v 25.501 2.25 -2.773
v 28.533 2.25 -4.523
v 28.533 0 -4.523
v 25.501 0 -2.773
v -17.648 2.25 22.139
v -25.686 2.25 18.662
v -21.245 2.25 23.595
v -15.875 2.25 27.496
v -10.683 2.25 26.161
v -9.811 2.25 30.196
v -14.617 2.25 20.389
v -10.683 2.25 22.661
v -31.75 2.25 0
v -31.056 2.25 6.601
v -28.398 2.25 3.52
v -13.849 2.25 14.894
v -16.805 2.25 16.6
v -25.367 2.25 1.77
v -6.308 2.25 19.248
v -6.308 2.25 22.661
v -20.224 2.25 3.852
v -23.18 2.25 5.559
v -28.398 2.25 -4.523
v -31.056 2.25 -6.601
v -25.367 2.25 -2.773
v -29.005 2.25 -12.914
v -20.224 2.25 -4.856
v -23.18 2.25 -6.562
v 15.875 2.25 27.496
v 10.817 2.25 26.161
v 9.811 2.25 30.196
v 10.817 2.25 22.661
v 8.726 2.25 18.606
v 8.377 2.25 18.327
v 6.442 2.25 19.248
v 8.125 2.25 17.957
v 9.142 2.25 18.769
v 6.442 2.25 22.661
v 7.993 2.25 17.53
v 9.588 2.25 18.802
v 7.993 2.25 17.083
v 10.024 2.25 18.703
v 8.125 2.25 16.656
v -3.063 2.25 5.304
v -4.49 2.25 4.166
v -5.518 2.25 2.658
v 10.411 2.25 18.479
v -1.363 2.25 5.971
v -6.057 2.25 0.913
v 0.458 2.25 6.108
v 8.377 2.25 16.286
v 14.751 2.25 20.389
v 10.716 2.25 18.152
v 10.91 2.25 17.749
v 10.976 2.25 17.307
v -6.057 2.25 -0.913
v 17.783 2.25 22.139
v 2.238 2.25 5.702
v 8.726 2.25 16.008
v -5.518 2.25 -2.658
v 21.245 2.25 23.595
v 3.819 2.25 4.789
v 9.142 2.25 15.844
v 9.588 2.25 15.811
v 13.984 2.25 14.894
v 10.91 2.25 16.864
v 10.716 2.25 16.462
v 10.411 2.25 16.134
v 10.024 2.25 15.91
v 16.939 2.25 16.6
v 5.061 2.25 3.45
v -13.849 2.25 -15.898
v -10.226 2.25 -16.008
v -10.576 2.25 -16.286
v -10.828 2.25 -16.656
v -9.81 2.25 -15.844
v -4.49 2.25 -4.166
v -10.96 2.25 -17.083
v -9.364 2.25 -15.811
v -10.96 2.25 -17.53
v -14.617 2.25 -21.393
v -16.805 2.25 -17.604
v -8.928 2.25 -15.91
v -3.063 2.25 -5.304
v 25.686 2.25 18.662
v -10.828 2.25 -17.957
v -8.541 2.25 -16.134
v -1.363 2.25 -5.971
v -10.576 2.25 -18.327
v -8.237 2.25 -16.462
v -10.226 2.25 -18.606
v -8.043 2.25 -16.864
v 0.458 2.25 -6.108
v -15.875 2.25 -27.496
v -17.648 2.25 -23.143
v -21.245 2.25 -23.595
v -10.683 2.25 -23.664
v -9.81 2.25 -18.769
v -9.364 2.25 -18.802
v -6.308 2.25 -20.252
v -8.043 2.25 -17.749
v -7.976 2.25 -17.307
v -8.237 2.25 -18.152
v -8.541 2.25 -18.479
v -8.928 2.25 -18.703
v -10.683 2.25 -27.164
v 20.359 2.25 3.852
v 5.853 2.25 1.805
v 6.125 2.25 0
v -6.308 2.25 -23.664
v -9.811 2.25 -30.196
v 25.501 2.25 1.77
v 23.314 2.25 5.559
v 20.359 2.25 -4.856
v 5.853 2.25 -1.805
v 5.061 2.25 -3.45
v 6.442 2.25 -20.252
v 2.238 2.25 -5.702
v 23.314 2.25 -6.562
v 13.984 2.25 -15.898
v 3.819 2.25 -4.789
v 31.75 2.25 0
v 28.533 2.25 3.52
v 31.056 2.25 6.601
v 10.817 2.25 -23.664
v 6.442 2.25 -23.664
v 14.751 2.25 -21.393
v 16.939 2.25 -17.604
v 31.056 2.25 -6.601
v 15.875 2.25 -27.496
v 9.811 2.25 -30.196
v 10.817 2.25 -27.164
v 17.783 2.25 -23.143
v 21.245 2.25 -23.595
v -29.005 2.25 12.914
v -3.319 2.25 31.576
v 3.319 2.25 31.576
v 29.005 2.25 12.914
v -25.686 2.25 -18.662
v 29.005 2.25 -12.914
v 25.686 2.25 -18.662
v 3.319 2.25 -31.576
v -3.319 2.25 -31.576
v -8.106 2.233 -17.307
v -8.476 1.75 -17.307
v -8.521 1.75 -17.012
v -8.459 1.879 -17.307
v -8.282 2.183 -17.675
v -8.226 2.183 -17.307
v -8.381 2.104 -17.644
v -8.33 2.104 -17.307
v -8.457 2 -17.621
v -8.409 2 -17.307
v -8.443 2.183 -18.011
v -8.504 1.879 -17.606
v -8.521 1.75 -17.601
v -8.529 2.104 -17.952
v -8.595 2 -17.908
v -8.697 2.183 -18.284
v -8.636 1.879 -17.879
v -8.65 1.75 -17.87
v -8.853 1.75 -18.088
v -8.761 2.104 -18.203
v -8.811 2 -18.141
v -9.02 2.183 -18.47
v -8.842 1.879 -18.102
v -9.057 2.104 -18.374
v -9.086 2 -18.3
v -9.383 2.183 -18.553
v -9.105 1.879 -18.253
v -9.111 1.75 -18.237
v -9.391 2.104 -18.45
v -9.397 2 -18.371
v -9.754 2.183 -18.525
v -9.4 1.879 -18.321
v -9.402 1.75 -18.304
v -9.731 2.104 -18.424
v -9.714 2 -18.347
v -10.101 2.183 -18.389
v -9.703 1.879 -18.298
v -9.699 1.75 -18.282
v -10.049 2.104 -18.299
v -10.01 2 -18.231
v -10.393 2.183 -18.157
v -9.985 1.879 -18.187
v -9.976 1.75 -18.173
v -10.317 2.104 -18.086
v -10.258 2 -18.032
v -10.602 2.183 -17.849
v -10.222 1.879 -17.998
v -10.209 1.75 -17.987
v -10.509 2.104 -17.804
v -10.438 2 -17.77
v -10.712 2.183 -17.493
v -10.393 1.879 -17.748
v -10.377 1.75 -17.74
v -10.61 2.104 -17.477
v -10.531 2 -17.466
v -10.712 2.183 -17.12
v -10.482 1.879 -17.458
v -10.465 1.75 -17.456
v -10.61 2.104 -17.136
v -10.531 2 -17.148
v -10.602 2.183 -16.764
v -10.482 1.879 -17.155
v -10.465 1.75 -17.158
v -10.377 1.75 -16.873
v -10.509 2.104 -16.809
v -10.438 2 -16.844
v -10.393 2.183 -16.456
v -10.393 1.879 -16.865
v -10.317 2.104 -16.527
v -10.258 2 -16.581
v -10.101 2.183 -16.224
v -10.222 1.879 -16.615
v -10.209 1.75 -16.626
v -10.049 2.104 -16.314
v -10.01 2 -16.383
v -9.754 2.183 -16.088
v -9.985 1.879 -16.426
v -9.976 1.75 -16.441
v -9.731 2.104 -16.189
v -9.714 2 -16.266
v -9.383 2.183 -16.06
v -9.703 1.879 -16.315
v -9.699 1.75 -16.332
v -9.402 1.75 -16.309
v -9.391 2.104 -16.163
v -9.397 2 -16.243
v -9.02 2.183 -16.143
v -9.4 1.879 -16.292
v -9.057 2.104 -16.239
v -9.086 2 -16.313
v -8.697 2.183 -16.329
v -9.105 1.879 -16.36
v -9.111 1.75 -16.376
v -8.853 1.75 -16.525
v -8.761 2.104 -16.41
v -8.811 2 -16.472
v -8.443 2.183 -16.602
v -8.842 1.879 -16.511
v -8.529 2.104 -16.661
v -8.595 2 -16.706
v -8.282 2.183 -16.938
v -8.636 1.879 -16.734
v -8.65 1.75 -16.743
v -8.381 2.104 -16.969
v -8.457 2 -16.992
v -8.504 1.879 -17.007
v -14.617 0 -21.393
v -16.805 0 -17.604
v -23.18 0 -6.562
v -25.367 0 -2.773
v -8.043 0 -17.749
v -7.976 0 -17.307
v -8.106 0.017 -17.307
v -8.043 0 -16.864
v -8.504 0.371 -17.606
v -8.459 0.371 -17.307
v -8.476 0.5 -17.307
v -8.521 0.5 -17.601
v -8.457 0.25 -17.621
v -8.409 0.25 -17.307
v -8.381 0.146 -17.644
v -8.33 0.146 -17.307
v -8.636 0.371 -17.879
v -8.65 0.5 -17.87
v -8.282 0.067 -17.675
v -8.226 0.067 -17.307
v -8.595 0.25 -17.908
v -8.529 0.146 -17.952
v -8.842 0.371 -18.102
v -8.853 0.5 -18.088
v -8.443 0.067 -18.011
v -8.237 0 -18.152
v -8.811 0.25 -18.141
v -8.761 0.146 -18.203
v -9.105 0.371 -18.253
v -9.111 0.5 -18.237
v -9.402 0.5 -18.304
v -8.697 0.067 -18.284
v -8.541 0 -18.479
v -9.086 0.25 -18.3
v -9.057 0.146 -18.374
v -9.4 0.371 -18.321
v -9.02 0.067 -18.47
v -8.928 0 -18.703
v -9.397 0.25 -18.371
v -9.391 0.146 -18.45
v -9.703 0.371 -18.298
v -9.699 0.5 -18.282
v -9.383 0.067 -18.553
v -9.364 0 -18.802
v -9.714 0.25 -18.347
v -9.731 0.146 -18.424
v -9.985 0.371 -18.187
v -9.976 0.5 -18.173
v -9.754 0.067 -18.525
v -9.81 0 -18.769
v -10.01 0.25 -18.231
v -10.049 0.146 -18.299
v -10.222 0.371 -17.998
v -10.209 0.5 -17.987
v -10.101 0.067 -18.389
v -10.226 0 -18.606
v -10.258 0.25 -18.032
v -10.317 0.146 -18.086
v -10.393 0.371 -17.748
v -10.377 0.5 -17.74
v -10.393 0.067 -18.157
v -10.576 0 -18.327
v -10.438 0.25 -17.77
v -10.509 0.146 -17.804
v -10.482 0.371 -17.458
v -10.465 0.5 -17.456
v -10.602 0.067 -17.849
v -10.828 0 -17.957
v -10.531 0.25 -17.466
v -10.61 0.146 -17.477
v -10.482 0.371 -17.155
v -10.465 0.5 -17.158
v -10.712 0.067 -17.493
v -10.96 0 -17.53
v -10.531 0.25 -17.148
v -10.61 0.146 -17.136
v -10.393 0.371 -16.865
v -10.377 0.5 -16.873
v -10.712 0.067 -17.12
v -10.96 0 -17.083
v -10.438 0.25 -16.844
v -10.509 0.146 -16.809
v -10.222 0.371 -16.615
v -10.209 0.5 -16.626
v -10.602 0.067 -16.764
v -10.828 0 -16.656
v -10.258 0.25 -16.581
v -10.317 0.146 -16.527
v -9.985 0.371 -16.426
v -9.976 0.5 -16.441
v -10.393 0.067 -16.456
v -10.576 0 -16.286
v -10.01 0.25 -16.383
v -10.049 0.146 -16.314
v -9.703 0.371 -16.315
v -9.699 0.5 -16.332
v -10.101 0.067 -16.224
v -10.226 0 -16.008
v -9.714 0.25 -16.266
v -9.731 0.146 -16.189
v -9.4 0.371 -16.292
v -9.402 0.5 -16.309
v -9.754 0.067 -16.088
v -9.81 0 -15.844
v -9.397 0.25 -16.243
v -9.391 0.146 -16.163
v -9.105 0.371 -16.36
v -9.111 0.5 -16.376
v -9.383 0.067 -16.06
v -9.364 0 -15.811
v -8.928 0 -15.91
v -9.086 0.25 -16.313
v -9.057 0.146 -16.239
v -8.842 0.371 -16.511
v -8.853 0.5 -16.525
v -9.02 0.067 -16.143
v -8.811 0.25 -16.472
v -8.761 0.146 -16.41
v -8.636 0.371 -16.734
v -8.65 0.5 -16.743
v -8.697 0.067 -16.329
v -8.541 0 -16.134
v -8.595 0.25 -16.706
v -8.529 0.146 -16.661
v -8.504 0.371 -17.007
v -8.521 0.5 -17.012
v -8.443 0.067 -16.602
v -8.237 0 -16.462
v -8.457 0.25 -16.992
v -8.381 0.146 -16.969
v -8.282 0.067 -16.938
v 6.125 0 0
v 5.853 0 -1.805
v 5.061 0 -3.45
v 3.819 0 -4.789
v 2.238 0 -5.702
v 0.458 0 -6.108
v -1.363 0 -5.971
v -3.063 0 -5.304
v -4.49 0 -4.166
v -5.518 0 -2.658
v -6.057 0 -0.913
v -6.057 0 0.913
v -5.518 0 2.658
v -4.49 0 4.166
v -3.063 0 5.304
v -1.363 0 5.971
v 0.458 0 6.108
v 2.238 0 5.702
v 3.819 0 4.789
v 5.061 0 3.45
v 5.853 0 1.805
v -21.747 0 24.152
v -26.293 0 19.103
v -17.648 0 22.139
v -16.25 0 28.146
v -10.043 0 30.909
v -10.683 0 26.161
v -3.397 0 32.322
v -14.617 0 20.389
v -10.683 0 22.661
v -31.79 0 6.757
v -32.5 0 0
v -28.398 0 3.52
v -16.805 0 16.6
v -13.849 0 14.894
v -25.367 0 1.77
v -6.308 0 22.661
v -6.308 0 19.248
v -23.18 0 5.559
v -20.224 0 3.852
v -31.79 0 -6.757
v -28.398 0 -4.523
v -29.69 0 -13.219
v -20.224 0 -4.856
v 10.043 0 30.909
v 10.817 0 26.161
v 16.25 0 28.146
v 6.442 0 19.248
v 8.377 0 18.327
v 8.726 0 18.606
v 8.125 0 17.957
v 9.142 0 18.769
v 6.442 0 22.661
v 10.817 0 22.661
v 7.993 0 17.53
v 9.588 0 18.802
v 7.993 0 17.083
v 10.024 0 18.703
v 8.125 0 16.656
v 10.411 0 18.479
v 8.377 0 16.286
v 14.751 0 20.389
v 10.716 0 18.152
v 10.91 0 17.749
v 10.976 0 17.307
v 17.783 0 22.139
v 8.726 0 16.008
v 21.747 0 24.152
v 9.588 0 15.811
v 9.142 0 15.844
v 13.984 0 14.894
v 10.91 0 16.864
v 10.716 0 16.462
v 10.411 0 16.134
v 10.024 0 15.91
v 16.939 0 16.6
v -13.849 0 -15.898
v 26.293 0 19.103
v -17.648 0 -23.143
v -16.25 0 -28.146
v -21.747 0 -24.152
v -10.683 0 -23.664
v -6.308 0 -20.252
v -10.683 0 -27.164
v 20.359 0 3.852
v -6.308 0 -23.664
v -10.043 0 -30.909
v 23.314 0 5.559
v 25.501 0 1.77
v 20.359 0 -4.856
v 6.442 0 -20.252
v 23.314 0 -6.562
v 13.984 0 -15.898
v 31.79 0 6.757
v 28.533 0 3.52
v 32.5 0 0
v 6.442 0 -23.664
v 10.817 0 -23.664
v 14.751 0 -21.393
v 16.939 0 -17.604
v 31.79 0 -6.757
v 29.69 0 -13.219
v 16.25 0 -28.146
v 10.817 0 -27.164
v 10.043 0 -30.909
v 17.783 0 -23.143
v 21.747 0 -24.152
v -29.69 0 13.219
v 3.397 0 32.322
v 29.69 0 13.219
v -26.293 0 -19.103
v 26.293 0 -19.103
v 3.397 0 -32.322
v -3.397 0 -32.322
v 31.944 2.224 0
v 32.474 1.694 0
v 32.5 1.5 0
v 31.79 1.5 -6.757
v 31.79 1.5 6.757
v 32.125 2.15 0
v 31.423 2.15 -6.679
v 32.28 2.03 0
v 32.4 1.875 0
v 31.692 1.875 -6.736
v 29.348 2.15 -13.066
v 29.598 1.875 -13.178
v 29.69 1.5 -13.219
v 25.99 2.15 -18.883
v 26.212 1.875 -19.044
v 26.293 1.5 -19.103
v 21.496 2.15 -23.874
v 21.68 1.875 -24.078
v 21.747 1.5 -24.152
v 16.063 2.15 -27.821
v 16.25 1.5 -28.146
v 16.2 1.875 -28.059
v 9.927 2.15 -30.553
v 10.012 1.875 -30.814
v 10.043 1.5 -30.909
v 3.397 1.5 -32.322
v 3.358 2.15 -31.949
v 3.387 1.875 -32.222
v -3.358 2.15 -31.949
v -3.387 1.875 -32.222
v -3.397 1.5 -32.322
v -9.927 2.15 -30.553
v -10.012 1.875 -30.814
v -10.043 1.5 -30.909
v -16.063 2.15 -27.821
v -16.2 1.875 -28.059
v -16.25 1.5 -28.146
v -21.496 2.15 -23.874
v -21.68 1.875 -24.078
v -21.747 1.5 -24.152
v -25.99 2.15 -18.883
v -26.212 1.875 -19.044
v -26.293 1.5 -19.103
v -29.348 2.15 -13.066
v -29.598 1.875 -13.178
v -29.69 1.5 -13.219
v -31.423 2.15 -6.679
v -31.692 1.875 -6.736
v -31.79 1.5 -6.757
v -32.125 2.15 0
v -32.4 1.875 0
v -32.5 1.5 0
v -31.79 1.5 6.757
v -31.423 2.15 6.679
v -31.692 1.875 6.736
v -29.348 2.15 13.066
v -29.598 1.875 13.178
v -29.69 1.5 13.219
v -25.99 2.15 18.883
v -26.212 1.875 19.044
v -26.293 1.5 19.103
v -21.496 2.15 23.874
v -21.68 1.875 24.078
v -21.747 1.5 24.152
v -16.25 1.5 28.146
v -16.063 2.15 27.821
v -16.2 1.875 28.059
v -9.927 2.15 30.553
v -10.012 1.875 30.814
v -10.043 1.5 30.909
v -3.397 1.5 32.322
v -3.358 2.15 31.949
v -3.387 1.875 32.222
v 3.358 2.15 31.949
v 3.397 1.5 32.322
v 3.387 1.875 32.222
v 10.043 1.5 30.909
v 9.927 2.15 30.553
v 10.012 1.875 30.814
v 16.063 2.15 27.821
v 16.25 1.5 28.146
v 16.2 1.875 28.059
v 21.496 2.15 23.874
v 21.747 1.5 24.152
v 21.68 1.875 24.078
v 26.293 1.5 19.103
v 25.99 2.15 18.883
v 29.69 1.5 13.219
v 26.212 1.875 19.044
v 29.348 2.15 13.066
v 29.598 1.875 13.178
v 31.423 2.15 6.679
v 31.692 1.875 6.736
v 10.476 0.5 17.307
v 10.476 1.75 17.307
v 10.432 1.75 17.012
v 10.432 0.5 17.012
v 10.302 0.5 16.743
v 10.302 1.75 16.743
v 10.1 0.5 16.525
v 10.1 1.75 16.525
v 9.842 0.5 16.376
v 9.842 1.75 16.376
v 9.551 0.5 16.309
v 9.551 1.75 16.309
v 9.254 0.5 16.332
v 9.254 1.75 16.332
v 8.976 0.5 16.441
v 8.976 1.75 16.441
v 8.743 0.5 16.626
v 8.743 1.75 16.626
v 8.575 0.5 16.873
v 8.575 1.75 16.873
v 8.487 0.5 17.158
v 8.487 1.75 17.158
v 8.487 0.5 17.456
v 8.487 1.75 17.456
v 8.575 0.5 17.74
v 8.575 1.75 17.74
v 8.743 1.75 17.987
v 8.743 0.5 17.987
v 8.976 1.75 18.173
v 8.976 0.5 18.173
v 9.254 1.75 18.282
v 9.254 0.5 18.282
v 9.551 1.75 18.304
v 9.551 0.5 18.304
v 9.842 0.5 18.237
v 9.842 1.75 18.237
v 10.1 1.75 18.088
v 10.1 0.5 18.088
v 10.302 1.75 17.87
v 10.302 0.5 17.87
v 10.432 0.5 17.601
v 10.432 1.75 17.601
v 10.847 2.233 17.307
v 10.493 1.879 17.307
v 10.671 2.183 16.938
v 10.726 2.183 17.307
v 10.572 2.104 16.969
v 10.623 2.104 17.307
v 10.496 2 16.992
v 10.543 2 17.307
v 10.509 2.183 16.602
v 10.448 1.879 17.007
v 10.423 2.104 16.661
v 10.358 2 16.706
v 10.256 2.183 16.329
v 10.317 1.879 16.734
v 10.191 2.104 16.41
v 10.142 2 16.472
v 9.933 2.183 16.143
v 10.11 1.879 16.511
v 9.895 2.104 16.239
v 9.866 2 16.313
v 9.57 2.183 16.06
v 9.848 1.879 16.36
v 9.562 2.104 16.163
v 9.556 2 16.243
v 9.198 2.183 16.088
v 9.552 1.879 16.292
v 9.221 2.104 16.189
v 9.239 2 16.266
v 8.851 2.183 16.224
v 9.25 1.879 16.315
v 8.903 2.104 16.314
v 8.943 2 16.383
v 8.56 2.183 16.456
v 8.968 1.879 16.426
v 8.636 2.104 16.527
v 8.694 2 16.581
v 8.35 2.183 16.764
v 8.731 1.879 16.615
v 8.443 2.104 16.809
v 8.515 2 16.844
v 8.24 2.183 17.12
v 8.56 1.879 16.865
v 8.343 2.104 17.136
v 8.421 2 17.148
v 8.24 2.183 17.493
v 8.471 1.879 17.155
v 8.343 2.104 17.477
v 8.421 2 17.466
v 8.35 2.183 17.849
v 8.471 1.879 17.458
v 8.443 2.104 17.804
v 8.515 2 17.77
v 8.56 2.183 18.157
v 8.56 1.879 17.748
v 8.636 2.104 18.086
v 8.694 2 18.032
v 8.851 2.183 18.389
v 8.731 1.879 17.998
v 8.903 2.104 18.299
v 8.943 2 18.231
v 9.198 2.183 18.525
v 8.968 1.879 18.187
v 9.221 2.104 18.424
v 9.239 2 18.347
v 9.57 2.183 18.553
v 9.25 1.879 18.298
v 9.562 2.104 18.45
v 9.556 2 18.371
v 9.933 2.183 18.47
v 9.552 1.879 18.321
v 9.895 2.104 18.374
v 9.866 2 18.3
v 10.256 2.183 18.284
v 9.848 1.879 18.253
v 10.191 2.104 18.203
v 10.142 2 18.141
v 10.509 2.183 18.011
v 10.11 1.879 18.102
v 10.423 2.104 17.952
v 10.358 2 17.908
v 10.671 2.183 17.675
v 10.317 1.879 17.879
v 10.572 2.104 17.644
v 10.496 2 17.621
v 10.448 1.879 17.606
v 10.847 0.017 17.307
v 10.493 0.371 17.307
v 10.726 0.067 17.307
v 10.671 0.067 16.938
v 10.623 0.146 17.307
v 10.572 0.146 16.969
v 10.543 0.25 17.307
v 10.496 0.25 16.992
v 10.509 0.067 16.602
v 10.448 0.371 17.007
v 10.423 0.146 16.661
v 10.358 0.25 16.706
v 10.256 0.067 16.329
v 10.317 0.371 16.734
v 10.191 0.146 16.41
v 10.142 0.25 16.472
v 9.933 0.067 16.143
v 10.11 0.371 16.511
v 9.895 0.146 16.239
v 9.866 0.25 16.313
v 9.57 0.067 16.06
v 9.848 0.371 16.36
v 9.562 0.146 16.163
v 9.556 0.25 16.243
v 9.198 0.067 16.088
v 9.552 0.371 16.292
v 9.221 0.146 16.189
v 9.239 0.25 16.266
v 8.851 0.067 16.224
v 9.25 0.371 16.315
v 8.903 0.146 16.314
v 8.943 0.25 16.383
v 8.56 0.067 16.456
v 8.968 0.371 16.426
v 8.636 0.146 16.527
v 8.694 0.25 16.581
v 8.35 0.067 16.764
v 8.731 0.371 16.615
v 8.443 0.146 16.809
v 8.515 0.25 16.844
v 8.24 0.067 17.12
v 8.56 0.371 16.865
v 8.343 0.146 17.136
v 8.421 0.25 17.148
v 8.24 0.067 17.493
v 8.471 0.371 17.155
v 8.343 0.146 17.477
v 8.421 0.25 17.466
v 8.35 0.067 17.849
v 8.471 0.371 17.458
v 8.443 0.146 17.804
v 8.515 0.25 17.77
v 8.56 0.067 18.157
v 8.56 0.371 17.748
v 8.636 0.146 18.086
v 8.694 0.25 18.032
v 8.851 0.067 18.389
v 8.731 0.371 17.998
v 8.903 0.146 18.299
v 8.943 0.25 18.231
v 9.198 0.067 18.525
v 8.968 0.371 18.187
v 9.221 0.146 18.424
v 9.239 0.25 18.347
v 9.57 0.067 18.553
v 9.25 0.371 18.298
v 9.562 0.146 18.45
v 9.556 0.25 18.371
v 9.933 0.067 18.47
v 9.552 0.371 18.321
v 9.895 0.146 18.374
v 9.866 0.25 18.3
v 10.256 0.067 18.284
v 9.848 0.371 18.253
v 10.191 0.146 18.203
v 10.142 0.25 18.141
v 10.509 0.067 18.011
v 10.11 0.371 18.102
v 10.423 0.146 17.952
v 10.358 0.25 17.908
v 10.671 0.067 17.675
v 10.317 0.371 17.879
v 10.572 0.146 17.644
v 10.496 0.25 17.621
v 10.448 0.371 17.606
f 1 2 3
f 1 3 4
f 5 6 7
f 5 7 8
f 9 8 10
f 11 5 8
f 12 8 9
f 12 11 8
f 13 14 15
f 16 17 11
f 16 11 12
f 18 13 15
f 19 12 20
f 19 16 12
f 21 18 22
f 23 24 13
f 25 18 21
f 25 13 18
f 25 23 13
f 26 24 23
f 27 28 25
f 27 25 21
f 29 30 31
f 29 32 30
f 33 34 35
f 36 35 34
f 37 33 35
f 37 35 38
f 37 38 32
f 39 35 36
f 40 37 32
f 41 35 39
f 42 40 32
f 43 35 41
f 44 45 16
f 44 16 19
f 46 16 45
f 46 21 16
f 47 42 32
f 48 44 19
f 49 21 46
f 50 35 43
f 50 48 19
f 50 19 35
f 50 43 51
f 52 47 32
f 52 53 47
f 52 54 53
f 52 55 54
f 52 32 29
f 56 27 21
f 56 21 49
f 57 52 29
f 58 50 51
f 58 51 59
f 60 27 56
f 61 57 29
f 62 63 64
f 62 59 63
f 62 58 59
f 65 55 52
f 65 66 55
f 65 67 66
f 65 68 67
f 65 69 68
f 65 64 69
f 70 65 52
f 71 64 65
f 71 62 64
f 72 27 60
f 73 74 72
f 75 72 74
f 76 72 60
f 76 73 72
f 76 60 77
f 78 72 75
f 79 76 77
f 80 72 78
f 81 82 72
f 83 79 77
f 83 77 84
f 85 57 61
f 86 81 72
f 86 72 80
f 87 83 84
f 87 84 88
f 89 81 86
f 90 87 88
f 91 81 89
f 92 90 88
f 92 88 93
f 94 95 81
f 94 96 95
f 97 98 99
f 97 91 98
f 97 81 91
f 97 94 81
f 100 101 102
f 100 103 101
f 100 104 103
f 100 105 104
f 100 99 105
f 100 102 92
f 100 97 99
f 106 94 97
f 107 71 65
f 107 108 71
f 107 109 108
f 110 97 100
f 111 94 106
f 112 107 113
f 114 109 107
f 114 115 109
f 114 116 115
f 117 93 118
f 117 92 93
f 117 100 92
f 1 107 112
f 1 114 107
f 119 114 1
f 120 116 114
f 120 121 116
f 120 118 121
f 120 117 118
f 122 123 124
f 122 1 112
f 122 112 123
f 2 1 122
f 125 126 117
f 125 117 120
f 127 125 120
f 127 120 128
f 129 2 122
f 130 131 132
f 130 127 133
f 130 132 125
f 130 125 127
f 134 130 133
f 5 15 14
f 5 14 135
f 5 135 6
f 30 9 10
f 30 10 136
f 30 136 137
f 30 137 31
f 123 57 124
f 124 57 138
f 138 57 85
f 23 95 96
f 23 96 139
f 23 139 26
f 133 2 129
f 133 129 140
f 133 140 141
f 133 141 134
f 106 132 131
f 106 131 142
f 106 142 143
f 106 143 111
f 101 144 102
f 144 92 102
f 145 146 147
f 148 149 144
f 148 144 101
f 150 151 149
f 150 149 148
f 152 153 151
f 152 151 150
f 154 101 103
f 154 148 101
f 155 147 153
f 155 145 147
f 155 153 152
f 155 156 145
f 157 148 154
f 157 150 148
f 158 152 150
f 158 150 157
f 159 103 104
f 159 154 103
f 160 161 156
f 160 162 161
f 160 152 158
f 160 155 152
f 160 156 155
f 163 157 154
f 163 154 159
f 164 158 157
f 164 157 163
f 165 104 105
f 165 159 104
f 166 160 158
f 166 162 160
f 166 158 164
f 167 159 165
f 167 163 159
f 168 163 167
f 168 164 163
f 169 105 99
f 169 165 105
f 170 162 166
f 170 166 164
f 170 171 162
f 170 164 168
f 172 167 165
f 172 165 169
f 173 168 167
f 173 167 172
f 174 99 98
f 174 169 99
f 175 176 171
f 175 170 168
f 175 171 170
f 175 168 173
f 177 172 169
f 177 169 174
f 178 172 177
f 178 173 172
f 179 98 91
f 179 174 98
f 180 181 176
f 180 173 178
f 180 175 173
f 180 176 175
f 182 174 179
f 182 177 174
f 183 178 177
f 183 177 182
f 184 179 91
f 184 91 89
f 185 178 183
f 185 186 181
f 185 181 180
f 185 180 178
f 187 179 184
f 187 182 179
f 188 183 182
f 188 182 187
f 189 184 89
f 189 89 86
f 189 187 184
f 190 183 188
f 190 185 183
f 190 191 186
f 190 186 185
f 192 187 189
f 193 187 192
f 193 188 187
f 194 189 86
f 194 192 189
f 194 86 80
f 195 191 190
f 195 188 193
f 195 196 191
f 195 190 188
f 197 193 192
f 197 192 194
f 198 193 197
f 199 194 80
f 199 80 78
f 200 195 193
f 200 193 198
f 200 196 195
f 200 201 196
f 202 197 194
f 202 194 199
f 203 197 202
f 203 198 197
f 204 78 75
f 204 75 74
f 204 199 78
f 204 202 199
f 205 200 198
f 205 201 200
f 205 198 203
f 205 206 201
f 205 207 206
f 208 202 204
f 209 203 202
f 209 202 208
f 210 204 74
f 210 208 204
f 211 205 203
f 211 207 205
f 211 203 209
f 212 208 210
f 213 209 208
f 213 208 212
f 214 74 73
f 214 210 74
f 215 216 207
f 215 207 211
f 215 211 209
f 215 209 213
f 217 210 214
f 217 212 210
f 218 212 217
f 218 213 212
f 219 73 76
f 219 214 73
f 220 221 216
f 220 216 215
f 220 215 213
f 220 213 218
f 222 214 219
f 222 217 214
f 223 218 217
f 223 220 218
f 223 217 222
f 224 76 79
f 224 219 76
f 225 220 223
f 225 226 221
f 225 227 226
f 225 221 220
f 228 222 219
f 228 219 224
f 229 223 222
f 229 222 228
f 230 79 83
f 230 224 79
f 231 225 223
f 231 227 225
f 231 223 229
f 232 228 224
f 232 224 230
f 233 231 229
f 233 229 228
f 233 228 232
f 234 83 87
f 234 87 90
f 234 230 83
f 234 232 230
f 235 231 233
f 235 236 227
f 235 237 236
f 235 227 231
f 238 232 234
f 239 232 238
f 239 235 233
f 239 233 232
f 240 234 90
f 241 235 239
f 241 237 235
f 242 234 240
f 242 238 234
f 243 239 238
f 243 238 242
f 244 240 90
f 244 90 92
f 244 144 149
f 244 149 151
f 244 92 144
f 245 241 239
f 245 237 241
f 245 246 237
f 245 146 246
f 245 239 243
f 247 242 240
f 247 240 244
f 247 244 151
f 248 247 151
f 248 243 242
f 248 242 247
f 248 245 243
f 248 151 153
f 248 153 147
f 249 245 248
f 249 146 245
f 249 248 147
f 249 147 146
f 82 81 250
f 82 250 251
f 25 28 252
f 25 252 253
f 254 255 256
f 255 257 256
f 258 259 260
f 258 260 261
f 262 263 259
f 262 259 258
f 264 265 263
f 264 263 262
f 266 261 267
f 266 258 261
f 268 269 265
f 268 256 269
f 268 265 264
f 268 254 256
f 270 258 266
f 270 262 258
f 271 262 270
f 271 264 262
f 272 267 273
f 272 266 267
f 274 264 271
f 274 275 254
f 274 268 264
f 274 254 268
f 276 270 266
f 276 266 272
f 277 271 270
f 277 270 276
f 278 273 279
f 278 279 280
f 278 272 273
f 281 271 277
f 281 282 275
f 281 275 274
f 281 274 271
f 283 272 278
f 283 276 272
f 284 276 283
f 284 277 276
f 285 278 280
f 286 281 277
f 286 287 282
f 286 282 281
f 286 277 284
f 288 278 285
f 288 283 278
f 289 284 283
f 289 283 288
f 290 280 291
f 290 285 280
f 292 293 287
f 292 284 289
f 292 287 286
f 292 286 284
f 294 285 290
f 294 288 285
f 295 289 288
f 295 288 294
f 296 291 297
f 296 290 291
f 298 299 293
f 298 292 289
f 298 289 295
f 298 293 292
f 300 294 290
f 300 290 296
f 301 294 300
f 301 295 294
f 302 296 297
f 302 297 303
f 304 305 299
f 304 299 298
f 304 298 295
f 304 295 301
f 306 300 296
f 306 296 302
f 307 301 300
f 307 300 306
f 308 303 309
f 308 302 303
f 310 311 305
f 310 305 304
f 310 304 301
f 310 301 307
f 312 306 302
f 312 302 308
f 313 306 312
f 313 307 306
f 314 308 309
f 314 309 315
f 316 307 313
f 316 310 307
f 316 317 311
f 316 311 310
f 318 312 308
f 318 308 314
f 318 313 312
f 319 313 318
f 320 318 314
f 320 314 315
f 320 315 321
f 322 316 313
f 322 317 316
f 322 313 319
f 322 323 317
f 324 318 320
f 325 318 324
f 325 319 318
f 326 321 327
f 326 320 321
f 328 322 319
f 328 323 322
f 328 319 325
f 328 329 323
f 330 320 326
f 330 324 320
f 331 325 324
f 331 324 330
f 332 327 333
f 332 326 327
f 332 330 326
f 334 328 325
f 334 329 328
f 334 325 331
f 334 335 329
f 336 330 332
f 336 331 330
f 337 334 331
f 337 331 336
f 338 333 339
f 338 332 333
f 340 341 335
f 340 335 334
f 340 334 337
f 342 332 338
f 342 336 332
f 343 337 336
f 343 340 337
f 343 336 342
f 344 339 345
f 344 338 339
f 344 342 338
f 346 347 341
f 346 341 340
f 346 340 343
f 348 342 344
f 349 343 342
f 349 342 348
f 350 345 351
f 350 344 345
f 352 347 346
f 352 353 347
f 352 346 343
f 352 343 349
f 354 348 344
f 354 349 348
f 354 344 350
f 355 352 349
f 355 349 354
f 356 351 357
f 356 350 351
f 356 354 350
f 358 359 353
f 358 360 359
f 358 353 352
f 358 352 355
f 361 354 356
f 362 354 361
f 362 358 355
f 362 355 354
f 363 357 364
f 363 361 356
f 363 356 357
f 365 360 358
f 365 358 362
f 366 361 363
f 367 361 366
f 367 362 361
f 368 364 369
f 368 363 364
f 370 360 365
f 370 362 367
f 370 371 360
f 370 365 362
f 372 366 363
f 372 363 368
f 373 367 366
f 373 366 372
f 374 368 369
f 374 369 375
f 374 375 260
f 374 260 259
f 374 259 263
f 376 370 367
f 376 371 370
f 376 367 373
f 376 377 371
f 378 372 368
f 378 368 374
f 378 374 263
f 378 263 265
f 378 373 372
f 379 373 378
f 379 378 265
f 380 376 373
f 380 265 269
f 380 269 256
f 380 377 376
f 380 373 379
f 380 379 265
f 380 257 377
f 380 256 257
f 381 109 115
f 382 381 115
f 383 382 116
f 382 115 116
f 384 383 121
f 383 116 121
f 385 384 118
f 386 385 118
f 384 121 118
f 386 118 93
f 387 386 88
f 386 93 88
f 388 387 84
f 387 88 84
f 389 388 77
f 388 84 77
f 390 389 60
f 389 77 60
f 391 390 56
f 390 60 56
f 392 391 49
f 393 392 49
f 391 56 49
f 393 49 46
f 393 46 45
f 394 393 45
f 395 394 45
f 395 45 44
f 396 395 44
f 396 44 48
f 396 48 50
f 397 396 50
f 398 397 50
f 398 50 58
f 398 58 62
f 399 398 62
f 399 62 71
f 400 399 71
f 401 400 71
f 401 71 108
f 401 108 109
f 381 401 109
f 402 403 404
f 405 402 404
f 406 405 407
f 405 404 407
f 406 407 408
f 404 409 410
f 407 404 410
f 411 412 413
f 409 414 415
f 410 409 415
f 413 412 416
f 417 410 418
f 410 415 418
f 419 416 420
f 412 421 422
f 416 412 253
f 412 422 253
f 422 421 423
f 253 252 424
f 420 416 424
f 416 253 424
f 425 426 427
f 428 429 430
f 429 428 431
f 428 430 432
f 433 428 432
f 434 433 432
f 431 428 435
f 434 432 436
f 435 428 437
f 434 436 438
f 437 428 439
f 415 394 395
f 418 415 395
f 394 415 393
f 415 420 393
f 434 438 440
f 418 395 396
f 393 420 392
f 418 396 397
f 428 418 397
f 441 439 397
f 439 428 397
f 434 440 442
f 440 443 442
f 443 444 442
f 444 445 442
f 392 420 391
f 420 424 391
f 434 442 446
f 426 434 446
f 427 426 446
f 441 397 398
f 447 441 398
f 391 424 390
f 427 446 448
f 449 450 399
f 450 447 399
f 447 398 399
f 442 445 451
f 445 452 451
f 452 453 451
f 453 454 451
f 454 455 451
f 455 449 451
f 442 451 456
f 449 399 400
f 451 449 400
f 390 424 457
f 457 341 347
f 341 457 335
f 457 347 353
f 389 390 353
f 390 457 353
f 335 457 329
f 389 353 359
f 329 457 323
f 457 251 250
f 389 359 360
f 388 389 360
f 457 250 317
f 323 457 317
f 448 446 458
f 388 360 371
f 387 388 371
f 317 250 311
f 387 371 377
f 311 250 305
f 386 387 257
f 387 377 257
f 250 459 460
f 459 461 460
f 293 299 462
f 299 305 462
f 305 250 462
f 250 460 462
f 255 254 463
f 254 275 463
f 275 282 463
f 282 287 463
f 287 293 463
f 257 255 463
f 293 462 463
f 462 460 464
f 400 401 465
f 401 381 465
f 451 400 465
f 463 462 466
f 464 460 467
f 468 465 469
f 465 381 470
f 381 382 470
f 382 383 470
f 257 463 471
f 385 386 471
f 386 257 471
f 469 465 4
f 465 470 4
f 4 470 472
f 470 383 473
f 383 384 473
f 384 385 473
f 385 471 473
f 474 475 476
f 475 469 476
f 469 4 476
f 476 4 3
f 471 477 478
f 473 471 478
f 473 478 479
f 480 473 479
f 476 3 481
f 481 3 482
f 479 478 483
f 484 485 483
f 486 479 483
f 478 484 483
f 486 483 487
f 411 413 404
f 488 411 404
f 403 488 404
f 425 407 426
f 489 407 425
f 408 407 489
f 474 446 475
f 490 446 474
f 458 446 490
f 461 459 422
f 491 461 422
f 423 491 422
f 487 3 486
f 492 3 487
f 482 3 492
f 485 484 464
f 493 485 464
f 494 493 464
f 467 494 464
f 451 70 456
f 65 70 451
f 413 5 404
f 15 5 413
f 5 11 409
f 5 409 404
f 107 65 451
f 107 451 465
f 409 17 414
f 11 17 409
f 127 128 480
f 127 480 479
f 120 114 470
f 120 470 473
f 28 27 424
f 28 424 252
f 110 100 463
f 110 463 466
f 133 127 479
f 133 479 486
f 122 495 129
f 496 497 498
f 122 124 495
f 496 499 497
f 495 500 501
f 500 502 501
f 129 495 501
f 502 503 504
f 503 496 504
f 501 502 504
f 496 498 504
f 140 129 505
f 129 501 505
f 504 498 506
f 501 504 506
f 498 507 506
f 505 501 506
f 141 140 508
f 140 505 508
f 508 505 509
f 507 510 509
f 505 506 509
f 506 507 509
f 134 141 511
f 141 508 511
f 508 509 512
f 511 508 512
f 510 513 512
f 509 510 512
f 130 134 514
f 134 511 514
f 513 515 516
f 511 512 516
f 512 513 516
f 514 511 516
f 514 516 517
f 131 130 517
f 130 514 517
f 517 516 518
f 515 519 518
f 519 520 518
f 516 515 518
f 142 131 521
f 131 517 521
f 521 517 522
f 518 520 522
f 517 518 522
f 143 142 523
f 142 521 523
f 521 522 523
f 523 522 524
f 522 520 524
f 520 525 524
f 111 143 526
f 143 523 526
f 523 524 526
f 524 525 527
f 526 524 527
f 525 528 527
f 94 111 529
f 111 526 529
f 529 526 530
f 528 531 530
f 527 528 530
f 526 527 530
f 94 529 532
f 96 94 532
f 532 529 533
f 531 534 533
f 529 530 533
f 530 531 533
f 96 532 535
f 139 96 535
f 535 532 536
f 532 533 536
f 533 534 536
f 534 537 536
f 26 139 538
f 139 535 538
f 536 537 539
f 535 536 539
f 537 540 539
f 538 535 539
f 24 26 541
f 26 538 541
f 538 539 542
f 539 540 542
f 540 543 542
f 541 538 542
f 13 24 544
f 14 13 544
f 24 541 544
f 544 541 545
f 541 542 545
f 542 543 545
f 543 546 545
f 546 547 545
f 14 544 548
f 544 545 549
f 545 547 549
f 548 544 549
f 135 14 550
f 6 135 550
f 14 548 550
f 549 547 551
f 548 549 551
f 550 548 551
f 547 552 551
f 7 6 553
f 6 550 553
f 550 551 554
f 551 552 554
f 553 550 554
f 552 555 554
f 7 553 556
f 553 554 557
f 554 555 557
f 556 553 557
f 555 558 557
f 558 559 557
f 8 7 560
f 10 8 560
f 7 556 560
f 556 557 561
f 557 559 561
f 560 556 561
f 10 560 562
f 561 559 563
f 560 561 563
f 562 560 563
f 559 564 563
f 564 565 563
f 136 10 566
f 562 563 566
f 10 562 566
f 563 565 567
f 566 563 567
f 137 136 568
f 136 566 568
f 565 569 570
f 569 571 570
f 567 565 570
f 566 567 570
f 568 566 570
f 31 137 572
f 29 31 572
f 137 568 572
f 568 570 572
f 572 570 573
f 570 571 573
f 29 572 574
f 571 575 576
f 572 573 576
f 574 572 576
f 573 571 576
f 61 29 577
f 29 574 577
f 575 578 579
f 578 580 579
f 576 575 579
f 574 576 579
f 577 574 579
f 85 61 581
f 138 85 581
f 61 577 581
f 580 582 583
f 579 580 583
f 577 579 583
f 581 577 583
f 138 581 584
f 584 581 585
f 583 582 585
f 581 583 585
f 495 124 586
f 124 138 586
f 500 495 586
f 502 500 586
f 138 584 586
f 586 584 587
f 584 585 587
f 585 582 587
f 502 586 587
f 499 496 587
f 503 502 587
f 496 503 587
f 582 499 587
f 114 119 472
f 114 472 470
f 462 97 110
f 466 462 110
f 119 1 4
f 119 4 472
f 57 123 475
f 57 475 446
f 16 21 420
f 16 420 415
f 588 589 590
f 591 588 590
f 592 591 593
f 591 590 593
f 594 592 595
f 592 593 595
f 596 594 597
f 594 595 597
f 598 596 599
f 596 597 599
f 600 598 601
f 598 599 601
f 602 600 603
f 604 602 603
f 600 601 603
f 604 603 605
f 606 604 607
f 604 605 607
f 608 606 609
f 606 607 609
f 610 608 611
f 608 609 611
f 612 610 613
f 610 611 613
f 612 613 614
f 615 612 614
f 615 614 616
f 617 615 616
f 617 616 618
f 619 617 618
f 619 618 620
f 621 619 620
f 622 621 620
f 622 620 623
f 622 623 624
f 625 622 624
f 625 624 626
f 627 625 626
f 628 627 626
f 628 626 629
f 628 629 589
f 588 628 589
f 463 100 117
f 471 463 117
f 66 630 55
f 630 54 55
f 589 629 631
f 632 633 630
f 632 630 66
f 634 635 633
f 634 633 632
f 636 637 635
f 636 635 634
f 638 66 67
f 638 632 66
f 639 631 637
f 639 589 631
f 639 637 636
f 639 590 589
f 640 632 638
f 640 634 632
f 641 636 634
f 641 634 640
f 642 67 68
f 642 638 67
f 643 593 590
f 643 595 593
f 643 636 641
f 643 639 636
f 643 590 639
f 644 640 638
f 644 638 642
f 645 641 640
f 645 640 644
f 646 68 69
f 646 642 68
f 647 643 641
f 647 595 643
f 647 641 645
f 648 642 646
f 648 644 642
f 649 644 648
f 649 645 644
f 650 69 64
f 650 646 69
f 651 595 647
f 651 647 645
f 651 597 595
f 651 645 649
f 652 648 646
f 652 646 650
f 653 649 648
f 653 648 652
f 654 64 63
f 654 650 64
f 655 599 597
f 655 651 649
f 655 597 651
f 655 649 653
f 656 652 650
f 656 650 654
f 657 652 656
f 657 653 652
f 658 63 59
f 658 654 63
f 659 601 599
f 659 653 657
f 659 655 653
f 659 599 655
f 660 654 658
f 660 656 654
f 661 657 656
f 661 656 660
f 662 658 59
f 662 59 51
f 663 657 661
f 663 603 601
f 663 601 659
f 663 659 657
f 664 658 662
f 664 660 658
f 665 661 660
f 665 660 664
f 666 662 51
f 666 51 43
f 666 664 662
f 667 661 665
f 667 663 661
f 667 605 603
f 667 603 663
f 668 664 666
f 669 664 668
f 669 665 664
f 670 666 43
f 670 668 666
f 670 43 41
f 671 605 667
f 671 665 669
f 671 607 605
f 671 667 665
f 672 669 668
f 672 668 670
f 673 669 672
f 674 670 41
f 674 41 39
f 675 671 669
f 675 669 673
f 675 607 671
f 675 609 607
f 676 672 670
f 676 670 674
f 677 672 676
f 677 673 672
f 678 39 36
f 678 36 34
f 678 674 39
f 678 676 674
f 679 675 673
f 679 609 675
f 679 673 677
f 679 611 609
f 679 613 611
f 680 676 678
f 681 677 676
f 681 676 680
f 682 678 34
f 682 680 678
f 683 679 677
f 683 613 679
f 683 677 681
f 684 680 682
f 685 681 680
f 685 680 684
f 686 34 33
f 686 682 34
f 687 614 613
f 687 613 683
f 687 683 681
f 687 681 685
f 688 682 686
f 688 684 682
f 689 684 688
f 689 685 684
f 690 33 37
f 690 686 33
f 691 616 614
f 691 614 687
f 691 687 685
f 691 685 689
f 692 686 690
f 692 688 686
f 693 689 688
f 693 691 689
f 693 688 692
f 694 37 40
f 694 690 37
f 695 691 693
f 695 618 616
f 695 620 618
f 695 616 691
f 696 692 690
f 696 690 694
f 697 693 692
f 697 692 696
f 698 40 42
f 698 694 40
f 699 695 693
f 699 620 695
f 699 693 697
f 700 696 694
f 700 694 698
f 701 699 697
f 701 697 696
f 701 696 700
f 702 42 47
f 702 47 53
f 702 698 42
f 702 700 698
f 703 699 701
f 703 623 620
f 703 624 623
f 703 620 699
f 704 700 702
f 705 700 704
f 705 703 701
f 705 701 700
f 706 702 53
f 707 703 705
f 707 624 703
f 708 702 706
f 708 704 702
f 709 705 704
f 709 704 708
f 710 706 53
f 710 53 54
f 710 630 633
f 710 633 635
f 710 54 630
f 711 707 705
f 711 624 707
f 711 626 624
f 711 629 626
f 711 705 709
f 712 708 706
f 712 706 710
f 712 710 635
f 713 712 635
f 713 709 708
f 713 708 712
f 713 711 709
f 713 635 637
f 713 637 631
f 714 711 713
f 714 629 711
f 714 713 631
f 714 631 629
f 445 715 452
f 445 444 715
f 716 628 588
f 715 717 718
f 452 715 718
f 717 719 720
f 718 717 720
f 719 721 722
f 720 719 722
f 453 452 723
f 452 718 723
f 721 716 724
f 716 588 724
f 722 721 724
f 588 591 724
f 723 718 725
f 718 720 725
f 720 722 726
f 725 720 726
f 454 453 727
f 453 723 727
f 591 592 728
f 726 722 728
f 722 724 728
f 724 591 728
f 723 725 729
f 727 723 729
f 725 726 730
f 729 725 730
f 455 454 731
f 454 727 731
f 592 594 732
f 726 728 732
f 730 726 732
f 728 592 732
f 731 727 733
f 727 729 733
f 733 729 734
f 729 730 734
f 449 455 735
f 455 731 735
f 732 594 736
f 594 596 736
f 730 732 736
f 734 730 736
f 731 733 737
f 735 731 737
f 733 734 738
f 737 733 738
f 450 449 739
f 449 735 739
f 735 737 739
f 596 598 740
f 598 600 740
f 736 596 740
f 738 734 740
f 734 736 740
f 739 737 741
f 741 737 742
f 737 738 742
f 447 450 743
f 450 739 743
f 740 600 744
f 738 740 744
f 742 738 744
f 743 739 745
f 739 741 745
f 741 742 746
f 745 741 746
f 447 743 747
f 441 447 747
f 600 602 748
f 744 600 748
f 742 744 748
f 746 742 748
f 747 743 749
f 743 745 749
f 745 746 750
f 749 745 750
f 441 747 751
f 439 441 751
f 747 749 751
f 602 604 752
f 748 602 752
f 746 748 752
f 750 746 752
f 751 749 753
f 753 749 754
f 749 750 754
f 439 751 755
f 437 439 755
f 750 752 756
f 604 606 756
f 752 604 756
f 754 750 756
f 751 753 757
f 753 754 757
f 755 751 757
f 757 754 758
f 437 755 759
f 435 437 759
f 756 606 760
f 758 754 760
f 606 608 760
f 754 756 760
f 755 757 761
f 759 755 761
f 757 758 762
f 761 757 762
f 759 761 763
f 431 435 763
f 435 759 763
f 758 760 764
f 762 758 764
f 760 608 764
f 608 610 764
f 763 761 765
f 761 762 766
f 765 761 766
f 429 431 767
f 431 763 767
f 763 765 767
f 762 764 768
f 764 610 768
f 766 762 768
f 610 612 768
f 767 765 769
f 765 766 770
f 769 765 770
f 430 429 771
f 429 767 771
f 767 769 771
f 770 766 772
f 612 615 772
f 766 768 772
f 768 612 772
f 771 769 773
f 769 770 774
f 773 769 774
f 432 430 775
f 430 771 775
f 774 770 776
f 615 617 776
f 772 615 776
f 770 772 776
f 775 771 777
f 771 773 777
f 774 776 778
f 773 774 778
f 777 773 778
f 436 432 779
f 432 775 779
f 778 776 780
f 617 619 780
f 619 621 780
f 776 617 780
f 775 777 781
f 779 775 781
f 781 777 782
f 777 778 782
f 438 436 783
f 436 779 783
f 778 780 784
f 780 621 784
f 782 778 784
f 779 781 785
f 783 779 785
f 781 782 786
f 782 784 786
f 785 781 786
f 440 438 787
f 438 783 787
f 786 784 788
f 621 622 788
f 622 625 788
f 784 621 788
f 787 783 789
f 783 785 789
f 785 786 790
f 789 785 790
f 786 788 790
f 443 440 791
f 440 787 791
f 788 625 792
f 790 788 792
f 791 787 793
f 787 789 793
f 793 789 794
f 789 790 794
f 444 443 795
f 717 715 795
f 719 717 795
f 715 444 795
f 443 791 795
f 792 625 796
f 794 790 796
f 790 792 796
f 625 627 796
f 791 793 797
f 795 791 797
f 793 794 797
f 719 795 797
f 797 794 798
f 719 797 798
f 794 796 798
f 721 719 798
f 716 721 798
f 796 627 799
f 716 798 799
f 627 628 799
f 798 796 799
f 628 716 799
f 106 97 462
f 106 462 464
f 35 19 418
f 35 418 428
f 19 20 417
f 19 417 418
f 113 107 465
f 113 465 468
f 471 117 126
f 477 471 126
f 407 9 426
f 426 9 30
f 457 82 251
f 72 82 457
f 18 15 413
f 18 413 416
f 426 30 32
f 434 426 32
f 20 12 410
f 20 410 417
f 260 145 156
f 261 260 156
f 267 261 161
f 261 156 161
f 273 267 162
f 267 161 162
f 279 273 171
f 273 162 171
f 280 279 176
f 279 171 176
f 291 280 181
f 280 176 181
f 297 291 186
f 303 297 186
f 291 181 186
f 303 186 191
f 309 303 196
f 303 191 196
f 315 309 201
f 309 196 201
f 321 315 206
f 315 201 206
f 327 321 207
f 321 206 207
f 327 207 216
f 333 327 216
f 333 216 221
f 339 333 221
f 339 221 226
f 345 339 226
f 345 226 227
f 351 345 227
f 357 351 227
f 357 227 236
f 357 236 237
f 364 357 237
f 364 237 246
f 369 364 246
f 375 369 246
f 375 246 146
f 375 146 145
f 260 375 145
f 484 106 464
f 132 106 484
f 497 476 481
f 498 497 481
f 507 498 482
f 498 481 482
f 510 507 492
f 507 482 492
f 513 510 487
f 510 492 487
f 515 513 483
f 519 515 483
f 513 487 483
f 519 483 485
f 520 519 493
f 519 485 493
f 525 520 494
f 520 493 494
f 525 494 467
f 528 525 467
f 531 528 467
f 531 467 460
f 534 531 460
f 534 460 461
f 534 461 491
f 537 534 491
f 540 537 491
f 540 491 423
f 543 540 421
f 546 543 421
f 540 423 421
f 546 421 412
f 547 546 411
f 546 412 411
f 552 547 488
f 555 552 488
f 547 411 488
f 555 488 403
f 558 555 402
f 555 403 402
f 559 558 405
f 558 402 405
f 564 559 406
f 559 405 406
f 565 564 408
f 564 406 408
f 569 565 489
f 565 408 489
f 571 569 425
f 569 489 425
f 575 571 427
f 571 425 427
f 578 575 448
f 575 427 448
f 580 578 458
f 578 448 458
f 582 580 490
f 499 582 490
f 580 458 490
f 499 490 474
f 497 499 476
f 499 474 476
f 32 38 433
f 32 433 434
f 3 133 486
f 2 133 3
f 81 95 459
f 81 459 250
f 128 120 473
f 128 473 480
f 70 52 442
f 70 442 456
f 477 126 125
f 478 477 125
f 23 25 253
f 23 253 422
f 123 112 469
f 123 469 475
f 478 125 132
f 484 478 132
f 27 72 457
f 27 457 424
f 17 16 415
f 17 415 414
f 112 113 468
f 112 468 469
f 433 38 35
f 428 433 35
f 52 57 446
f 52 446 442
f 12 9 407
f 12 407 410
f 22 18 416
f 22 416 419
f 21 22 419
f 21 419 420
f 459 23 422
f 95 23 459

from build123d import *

# Parameters (mm, degrees)
SKETCH1_R           = 32.5
BOSS_EXTRUDE1_DEPTH = 2.25
SKETCH15_W          = 12.75
SKETCH15_H          = 3.5
CUT_EXTRUDE6_DEPTH  = 17
SKETCH17_W          = 21.5
SKETCH17_H          = 3.5
CUT_EXTRUDE7_DEPTH  = 12
SKETCH19_R          = 1
CUT_EXTRUDE9_DEPTH  = 16
FILLET4_R           = 0.5
FILLET5_R           = 0.5
SKETCH21_R          = 6.125
CUT_EXTRUDE11_DEPTH = 13
FILLET8_R           = 0.75


with BuildPart() as part:
    # Sketch1 → Boss-Extrude1 (new body)
    with BuildSketch(Plane(origin=(0, 0, 0), x_dir=(1, 0, 0), z_dir=(0, 1, 0))):
        Circle(SKETCH1_R)
    extrude(amount=BOSS_EXTRUDE1_DEPTH)

    # Sketch15 → Cut-Extrude6 (cut)
    with BuildSketch(Plane(origin=(0.067128405, 2.25, -0.501790944), x_dir=(1, 0, 0), z_dir=(0, 1, 0))):
        Polygon((-13.916501725, 15.395911949), (-20.291501725, 4.354088051), (-23.322590638, 6.104088051), (-16.947590638, 17.145911949), align=None)
        with Locations((0, 21.5)):
            Rectangle(SKETCH15_W, SKETCH15_H)
        Polygon((-20.291501725, -4.354088051), (-13.916501725, -15.395911949), (-16.947590638, -17.145911949), (-23.322590638, -6.104088051), align=None)
        with Locations((0, -21.5)):
            Rectangle(SKETCH15_W, SKETCH15_H)
        Polygon((13.916501725, -15.395911949), (20.291501725, -4.354088051), (23.322590638, -6.104088051), (16.947590638, -17.145911949), align=None)
        Polygon((20.291501725, 4.354088051), (13.916501725, 15.395911949), (16.947590638, 17.145911949), (23.322590638, 6.104088051), align=None)
    extrude(amount=-CUT_EXTRUDE6_DEPTH, mode=Mode.SUBTRACT)

    # Sketch17 → Cut-Extrude7 (cut)
    with BuildSketch(Plane(origin=(0.067128405, 2.25, -0.501790944), x_dir=(1, 0, 0), z_dir=(0, 1, 0))):
        Polygon((-17.715410458, -22.641027784), (-28.465410458, -4.021481603), (-25.434321545, -2.271481603), (-14.684321545, -20.891027784), align=None)
        with Locations((0, -24.912509387)):
            Rectangle(SKETCH17_W, SKETCH17_H)
        Polygon((-28.465410458, 4.021481603), (-17.715410458, 22.641027784), (-14.684321545, 20.891027784), (-25.434321545, 2.271481603), align=None)
        with Locations((0, 24.912509387)):
            Rectangle(SKETCH17_W, SKETCH17_H)
        Polygon((17.715410458, 22.641027784), (28.465410458, 4.021481603), (25.434321545, 2.271481603), (14.684321545, 20.891027784), align=None)
        Polygon((28.465410458, -4.021481603), (17.715410458, -22.641027784), (14.684321545, -20.891027784), (25.434321545, -2.271481603), align=None)
    extrude(amount=-CUT_EXTRUDE7_DEPTH, mode=Mode.SUBTRACT)

    # Sketch19 → Cut-Extrude9 (cut)
    with BuildSketch(Plane(origin=(0, 2.25, 0), x_dir=(1, 0, 0), z_dir=(0, 1, 0))):
        with Locations((-9.476258541, 17.306577458)):
            Circle(SKETCH19_R)
        with Locations((9.476258541, -17.306577458)):
            Circle(SKETCH19_R)
    extrude(amount=-CUT_EXTRUDE9_DEPTH, mode=Mode.SUBTRACT)

    # Fillet4
    fillet4_edges = [part.edges().sort_by_distance(p)[0] for p in [
        (-10.476258541, 2.25, -17.306577458),
        (8.476258541, 2.25, 17.306577458),
    ]]
    fillet(fillet4_edges, radius=FILLET4_R)

    # Fillet5
    fillet5_edges = [part.edges().sort_by_distance(p)[0] for p in [
        (-10.476258541, 0, -17.306577458),
        (8.476258541, 0, 17.306577458),
    ]]
    fillet(fillet5_edges, radius=FILLET5_R)

    # Sketch21 → Cut-Extrude11 (cut)
    with BuildSketch(Plane(origin=(0, 2.25, 0), x_dir=(1, 0, 0), z_dir=(0, 1, 0))):
        Circle(SKETCH21_R)
    extrude(amount=-CUT_EXTRUDE11_DEPTH, mode=Mode.SUBTRACT)

    # Fillet8
    fillet8_edges = [part.edges().sort_by_distance(p)[0] for p in [
        (-32.5, 2.25, 0),
    ]]
    fillet(fillet8_edges, radius=FILLET8_R)


solid = part.part
